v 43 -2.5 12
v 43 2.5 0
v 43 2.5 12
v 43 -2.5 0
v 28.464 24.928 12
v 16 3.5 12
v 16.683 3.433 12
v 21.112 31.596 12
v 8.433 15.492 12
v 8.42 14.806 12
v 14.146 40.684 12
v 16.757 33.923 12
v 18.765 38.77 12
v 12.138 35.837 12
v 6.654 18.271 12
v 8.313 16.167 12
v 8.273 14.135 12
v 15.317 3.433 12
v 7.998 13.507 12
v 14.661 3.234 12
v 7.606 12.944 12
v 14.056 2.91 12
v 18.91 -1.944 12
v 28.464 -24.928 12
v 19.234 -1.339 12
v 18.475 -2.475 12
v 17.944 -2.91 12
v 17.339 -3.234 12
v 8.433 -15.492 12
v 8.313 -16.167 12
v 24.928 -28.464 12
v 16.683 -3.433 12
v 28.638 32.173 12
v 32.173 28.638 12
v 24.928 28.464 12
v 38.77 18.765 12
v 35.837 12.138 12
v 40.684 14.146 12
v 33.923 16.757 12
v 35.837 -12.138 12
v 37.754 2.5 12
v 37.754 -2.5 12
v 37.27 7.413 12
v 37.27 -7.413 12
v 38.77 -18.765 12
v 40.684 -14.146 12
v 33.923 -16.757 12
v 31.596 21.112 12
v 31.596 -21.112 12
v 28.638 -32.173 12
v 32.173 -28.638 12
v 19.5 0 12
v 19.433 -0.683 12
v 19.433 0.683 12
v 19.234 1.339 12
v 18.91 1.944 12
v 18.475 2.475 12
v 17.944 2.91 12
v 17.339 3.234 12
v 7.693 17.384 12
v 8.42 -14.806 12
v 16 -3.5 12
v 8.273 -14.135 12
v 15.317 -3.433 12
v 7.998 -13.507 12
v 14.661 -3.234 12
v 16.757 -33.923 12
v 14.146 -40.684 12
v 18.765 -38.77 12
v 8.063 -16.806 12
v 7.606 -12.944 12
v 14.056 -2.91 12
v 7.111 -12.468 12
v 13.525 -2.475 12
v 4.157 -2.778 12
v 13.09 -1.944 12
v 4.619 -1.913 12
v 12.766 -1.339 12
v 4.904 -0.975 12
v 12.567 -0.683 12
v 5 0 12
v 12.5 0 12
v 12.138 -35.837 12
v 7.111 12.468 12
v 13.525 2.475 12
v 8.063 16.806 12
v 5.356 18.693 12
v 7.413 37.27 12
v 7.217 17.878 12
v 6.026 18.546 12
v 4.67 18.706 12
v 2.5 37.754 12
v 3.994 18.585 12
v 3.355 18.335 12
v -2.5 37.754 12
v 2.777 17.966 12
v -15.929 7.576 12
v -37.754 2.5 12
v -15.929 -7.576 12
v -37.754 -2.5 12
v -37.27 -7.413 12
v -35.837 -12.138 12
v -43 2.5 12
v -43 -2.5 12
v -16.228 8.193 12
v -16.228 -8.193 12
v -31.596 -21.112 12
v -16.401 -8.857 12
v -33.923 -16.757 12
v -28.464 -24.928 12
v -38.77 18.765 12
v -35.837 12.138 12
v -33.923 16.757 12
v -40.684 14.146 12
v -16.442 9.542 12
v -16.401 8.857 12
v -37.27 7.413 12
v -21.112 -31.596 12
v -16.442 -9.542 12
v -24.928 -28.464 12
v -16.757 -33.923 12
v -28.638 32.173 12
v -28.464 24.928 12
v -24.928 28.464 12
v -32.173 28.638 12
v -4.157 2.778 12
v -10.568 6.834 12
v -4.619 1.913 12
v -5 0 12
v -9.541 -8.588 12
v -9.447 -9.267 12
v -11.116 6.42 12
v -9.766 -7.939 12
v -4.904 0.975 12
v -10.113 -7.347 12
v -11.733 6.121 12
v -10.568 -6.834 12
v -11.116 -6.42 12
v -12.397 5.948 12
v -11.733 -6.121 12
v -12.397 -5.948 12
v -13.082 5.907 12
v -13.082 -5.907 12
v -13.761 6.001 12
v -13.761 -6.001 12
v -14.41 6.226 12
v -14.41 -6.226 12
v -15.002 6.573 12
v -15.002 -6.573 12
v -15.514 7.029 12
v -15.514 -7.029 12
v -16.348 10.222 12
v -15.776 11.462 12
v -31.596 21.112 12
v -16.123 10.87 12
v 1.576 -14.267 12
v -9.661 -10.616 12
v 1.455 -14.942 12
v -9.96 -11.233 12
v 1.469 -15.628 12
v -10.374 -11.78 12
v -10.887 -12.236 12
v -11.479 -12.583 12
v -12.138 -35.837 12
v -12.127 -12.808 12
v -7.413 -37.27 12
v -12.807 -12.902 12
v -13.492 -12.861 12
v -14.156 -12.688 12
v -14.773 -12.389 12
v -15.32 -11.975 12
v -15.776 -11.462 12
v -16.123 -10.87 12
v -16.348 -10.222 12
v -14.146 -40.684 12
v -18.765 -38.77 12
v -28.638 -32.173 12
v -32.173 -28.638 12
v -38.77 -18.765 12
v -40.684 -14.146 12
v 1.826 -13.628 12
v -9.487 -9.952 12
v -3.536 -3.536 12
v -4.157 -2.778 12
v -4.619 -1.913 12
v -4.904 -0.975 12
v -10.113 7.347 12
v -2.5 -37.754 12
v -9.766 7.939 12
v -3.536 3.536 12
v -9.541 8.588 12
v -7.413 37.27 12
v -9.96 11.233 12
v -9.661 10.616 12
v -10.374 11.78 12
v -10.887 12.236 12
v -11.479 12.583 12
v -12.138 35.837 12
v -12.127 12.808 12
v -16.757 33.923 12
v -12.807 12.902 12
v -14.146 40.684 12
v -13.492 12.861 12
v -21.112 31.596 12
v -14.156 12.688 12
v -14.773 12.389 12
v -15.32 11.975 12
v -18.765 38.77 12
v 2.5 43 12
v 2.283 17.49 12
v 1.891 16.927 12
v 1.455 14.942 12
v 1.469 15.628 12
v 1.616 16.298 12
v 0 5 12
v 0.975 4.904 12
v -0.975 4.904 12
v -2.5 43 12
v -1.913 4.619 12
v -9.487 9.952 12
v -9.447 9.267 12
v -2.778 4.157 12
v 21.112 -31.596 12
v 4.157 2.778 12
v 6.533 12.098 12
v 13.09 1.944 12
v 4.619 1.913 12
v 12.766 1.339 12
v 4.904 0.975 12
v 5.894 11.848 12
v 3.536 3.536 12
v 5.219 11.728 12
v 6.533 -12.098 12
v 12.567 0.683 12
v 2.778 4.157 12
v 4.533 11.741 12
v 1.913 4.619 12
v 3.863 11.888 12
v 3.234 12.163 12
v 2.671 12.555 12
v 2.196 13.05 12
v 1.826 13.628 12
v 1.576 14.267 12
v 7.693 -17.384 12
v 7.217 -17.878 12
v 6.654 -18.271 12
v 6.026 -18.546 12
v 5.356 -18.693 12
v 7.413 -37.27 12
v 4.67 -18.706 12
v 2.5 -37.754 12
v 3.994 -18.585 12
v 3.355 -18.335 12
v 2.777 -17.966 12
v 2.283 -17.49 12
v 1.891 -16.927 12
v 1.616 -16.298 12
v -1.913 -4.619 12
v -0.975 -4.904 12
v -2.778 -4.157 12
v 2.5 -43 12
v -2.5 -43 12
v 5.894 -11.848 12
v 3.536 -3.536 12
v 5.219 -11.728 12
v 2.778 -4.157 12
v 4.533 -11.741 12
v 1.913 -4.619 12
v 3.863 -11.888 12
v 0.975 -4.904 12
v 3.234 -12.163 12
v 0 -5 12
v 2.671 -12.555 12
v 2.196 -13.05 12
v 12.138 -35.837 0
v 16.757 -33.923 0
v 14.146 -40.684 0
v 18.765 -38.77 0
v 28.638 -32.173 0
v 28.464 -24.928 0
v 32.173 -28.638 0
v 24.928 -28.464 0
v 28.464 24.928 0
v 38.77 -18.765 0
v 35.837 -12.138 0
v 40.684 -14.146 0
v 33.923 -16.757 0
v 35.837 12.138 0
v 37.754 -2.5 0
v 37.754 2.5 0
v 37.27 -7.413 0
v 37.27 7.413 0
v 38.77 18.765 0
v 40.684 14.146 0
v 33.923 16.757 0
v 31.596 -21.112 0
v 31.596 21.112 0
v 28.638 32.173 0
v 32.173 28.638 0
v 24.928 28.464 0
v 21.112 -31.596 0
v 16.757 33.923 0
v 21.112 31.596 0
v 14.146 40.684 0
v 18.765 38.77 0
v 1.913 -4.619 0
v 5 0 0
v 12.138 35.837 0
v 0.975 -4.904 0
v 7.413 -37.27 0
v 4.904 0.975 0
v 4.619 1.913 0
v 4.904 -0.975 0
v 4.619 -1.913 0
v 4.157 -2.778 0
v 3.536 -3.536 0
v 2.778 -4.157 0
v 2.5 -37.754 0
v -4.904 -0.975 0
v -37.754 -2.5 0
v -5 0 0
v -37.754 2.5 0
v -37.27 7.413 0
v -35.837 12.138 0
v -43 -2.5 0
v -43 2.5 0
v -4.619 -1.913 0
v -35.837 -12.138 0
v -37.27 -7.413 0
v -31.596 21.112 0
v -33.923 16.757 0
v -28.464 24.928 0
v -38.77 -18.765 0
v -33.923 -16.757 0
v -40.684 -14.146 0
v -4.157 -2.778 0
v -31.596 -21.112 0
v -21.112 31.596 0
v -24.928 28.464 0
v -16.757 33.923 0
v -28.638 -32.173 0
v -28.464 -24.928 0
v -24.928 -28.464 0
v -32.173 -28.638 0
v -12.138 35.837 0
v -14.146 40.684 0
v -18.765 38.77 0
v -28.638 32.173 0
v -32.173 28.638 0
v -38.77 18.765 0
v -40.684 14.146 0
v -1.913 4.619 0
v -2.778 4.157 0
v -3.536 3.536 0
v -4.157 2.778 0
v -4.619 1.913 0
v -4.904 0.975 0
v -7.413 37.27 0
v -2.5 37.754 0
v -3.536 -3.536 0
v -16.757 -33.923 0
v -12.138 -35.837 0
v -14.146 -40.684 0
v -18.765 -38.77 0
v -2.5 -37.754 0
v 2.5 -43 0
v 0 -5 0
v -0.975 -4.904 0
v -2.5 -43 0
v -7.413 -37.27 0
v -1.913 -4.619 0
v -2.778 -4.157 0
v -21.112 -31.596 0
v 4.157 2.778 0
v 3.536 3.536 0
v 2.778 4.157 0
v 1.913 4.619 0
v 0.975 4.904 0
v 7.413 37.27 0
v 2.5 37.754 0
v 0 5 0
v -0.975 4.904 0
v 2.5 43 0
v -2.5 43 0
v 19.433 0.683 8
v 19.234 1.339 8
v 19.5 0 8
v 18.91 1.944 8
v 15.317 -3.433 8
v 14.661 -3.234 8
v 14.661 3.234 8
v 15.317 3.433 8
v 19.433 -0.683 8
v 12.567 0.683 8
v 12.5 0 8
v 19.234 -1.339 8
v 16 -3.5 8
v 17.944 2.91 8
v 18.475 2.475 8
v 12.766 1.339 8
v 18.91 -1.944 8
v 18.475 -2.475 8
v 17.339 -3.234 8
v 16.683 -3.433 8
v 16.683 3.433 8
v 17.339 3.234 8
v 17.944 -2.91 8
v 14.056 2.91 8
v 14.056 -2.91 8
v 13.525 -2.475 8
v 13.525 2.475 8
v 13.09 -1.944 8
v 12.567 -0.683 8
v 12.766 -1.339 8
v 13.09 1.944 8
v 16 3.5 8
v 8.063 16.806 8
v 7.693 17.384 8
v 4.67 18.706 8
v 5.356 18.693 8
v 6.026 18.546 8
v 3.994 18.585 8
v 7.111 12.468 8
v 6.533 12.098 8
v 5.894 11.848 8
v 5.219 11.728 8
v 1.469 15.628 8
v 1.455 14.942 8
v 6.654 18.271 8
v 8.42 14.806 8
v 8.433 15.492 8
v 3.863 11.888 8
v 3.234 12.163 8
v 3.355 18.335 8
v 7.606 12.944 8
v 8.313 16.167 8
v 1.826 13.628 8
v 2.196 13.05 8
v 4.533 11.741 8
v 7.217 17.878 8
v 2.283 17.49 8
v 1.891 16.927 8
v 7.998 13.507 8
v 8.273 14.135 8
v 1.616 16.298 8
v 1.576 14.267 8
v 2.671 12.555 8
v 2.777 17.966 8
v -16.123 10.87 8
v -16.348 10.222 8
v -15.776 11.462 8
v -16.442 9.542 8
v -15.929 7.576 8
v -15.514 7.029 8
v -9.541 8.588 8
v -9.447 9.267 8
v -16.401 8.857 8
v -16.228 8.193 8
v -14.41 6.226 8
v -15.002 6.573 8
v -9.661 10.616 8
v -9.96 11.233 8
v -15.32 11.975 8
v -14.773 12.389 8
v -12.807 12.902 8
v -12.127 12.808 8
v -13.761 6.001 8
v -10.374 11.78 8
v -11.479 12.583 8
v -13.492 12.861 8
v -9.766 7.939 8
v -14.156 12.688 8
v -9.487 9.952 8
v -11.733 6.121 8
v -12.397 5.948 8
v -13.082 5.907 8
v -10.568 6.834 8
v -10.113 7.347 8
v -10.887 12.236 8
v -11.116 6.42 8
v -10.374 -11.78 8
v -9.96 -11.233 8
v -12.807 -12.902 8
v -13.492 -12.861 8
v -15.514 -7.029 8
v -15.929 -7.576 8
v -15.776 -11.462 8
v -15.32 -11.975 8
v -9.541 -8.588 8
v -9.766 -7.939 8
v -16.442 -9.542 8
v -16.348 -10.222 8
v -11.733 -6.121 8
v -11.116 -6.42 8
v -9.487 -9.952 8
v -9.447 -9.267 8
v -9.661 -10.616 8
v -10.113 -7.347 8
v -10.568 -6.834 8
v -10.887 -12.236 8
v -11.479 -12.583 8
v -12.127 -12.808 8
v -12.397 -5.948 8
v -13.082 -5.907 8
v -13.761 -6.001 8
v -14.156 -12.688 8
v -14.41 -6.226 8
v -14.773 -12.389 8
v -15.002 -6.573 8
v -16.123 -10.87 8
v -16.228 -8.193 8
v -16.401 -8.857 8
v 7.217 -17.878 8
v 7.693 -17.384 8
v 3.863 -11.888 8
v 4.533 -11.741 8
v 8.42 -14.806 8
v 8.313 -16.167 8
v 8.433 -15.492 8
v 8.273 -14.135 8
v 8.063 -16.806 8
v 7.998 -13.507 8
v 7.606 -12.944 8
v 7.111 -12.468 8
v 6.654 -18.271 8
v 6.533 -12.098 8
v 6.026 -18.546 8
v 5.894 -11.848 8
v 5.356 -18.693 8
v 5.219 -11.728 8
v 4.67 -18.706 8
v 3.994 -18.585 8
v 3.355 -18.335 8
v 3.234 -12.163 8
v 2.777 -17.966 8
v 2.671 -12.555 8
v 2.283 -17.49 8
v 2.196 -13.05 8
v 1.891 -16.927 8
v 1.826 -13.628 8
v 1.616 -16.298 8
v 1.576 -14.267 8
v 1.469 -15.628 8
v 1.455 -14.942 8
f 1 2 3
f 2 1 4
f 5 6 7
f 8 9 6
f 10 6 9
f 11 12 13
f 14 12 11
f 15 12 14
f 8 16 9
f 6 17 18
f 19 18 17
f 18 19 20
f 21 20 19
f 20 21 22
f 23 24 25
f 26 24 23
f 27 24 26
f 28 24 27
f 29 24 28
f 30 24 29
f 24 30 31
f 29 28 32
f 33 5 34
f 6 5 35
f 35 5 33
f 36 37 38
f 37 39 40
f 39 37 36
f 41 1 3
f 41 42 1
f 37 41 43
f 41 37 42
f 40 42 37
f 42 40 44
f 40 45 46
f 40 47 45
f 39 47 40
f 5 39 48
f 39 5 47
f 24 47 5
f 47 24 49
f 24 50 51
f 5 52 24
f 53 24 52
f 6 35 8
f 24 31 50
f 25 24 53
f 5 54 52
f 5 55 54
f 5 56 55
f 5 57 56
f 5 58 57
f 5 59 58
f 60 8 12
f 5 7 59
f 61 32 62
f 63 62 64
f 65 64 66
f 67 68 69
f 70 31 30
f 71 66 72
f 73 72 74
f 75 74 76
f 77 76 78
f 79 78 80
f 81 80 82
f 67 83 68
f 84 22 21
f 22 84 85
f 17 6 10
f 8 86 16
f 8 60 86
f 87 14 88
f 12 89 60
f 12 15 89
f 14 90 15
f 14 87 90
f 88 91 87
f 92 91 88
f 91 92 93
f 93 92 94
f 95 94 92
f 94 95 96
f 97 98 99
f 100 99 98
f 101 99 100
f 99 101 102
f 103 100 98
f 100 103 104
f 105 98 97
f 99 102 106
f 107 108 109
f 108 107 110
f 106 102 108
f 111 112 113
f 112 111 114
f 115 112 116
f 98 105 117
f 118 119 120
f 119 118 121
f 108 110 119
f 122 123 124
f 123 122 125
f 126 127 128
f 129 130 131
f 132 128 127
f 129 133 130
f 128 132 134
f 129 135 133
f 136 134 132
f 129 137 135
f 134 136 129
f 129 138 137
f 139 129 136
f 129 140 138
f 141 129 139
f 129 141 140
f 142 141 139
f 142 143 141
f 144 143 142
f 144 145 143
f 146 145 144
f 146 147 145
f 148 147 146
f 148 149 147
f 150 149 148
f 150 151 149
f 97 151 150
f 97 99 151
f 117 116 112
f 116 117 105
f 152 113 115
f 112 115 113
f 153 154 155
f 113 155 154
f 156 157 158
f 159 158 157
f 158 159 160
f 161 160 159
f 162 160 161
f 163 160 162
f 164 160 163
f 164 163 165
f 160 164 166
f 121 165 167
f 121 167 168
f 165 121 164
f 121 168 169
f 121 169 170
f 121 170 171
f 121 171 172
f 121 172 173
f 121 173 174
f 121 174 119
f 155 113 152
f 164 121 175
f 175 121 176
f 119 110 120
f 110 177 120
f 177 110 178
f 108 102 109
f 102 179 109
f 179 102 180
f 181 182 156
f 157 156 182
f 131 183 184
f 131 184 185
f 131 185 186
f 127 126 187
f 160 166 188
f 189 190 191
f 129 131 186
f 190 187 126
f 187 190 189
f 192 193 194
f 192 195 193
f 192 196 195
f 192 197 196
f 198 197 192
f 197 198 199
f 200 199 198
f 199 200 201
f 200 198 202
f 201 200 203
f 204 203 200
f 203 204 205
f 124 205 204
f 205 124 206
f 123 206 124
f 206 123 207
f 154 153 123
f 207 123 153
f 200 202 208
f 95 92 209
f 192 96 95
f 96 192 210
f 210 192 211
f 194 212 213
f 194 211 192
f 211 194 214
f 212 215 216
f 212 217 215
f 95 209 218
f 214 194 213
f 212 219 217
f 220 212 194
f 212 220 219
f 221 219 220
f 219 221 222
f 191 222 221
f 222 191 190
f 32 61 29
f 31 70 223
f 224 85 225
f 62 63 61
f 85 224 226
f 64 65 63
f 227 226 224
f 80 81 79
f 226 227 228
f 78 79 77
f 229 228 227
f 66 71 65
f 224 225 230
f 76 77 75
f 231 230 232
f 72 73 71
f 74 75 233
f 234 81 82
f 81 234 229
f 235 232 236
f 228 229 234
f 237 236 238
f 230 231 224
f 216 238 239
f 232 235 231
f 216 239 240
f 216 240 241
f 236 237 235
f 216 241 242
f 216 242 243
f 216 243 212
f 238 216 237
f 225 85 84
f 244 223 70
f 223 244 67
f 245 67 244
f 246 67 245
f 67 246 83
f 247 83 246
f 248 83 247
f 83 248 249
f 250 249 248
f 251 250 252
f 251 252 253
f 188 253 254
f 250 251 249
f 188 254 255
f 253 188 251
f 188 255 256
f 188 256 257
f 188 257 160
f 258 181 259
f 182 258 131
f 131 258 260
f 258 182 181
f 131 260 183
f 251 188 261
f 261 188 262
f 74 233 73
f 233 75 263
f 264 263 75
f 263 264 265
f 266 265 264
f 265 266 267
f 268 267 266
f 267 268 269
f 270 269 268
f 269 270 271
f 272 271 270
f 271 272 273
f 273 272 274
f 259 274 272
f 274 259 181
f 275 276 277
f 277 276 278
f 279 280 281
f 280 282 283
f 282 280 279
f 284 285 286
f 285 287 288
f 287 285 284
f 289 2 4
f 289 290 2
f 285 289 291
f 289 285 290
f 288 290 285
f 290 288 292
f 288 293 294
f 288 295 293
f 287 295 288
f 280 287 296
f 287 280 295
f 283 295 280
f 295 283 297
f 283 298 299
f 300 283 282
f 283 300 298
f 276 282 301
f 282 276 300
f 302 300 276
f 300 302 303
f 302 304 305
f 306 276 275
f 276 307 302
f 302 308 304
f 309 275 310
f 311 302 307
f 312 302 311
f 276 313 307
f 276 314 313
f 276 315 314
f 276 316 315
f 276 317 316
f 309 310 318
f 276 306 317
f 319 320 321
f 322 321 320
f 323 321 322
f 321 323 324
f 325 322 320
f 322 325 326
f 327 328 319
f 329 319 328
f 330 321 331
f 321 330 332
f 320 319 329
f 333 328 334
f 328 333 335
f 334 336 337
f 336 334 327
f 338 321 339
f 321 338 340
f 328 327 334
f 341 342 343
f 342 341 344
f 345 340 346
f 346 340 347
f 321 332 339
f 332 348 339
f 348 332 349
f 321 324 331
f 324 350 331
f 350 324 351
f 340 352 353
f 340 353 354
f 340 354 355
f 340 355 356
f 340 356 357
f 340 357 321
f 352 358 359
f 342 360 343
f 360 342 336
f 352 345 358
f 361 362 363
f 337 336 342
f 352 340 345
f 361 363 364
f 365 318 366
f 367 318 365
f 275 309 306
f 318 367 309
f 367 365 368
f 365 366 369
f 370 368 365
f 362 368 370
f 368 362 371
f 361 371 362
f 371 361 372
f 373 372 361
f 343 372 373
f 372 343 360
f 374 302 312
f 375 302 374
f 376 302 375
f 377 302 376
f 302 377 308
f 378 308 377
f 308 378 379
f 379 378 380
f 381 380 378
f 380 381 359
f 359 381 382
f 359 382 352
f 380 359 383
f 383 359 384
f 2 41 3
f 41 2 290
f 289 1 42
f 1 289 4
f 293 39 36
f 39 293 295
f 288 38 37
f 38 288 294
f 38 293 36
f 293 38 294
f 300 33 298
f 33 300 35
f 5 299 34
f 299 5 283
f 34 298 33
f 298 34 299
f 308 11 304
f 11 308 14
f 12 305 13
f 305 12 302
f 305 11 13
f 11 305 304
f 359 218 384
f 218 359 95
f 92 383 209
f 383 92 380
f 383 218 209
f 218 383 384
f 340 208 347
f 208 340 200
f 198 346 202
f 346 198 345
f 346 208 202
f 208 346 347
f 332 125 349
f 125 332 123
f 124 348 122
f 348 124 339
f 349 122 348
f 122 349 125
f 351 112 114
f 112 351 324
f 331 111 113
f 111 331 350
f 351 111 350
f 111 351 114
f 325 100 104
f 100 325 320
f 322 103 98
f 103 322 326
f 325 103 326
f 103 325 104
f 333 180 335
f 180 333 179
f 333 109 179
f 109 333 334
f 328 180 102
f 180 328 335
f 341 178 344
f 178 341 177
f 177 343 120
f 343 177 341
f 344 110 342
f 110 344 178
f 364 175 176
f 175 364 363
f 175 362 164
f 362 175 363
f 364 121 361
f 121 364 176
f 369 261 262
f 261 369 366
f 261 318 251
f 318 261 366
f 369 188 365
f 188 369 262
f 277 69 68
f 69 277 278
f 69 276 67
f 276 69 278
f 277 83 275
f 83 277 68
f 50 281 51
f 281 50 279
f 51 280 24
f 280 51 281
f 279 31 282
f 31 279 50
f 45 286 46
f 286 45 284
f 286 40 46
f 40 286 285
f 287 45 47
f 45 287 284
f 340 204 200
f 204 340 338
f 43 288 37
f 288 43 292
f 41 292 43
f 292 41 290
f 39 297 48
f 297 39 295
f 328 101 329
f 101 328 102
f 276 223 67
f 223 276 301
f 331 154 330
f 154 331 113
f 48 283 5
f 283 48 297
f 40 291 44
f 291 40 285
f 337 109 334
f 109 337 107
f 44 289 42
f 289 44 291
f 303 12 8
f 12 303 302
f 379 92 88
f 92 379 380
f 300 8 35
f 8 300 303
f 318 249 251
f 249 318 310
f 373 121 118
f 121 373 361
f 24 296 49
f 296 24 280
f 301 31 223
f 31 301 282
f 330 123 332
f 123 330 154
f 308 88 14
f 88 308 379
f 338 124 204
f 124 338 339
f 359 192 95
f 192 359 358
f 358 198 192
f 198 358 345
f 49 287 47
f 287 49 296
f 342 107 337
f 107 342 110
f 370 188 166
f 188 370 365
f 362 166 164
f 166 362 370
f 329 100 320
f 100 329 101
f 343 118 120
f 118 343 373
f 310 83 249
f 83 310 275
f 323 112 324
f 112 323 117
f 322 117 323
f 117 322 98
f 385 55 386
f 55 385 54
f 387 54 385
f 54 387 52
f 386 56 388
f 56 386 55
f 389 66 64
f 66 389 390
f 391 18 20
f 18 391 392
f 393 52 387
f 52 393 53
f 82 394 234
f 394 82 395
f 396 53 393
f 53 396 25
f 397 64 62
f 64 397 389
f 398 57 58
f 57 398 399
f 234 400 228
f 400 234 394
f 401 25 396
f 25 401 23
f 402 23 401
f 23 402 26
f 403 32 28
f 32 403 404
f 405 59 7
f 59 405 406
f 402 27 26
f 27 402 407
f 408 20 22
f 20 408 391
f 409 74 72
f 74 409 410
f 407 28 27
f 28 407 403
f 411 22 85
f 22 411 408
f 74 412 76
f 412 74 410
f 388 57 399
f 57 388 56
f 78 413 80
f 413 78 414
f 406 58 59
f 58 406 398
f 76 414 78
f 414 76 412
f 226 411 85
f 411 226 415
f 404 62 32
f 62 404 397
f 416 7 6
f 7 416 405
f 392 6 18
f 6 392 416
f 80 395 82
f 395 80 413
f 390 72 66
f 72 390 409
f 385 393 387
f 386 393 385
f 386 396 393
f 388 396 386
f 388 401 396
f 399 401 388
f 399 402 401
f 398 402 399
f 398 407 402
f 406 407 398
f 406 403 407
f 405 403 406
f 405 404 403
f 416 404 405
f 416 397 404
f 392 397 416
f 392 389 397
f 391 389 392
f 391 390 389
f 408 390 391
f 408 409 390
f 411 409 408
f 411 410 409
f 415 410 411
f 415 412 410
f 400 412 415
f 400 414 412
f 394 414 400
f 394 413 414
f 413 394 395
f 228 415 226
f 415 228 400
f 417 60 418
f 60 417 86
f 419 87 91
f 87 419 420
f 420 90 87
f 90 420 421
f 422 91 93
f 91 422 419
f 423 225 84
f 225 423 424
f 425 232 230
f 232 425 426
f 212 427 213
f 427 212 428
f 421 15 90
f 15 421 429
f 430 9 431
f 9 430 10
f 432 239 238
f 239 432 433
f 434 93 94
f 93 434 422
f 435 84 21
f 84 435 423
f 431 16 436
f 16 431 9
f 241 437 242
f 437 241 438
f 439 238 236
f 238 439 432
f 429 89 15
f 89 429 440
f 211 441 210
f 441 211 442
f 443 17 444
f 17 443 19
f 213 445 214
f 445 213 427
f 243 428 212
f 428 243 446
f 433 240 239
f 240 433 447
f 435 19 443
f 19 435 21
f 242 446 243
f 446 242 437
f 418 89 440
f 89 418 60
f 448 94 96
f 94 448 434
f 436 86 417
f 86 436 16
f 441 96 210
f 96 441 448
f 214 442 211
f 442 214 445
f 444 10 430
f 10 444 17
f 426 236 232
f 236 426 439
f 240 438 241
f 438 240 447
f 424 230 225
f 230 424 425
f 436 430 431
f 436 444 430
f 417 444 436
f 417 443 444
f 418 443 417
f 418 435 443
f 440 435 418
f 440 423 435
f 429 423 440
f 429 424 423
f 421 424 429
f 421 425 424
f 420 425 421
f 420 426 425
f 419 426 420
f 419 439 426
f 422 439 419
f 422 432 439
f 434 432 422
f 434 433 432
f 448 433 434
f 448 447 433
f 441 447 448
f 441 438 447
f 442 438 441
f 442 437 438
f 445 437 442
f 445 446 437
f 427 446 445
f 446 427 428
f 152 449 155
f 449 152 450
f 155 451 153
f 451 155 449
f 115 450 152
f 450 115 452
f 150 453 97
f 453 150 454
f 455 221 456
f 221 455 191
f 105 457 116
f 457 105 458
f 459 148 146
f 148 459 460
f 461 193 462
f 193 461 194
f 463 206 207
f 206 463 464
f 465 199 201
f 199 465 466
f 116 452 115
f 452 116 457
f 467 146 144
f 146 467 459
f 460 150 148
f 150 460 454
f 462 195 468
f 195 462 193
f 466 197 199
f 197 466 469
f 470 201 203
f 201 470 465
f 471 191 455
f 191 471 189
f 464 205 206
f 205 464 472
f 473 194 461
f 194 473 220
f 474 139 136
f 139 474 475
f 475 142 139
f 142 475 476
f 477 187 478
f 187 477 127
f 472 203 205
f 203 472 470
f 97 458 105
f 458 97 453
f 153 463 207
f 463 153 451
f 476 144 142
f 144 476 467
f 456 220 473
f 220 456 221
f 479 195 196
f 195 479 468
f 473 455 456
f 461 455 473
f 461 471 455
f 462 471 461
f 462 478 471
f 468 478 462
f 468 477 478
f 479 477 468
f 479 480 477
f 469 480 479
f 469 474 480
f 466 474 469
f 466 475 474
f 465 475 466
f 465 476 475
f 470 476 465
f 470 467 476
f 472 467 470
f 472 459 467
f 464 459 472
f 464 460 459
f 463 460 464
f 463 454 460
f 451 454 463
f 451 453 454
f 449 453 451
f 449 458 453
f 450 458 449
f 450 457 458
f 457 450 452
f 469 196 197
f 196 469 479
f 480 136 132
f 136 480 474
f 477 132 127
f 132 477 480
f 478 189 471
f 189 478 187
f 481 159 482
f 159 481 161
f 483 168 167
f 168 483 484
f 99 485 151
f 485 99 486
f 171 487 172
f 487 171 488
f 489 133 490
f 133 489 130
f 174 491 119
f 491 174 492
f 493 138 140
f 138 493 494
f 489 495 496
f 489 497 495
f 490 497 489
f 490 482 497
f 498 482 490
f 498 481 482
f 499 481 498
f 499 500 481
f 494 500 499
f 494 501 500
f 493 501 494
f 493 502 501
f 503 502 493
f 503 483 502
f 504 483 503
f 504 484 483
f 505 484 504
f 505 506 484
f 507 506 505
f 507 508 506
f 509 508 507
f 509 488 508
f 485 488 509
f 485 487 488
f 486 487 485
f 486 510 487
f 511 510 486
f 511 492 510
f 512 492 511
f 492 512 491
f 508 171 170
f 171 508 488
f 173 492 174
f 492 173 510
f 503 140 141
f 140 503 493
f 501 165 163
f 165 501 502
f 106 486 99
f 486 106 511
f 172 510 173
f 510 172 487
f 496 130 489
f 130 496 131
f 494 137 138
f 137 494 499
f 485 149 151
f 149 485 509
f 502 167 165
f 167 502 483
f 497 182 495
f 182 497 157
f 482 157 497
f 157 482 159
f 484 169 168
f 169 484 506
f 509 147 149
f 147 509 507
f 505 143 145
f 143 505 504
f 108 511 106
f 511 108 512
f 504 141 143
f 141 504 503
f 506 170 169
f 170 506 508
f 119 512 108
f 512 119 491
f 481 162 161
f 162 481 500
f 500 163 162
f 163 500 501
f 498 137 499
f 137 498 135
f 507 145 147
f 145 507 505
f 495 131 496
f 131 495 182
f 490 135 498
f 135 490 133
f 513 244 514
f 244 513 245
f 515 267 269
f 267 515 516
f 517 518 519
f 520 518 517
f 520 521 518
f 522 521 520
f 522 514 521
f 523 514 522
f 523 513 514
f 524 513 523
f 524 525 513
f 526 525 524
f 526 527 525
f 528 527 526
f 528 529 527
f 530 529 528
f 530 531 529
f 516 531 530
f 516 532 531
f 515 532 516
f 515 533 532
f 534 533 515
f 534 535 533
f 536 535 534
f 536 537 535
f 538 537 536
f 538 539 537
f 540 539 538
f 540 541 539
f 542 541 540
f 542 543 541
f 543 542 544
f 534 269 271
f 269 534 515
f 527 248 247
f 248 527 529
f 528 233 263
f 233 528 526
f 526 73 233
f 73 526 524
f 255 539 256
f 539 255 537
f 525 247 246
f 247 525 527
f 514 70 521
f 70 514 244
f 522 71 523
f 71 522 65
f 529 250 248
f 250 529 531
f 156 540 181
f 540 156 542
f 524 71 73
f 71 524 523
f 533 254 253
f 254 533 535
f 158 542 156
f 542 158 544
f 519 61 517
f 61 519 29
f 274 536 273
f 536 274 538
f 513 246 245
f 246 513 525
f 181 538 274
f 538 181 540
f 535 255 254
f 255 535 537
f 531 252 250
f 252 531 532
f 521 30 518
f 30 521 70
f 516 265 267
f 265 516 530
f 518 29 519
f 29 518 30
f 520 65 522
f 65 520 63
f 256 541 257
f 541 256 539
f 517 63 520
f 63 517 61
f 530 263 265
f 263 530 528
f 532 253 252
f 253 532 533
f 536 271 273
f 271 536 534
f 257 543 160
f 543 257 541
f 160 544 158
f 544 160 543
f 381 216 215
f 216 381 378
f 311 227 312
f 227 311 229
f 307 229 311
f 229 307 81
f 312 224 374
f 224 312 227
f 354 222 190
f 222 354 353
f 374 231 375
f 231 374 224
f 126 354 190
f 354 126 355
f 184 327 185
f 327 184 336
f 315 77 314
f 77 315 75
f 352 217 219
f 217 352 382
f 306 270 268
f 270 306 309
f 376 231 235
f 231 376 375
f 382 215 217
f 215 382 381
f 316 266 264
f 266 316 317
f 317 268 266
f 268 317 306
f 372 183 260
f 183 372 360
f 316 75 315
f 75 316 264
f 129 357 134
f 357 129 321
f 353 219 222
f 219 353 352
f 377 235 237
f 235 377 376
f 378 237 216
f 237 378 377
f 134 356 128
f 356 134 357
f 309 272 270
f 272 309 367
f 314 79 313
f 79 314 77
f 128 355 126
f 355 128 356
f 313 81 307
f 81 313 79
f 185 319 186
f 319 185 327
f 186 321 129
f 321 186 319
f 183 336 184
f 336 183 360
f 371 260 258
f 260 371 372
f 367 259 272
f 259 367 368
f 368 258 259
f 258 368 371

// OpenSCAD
$fn = 32;

// ----------------------------------------------------------------------
// Spur blank: lightened gear blank
// ----------------------------------------------------------------------

// --- parameters (mm) ---
disc_r = 38;              // blank root radius
disc_t = 12;              // blank thickness
n_teeth = 16;             // stub tooth count
tooth_w = 5;              // tooth width at the root
tooth_h = 5;              // tooth height above the root
bore_r = 5;               // central bore radius
ring_r = 16;              // lightening pocket ring radius
pocket_r = 3.5;           // lightening pocket radius

out_r = disc_r + tooth_h;  // tip radius
bbox_x = 86.0;  // measured width over the teeth
bbox_y = 86.0;  // measured depth over the teeth

difference() {
union() {
  cylinder(r = disc_r, h = disc_t);
  for (i = [0 : n_teeth - 1])
    rotate([0, 0, i * 360 / n_teeth])
      translate([disc_r - 1, -tooth_w / 2, 0])
        cube([tooth_h + 1, tooth_w, disc_t]);
}
  translate([0, 0, -1]) cylinder(r = bore_r, h = disc_t + 2);
  for (i = [0 : 5])
    rotate([0, 0, i * 72])
      translate([ring_r, 0, disc_t - 4])
        cylinder(r = pocket_r, h = 5);
}
